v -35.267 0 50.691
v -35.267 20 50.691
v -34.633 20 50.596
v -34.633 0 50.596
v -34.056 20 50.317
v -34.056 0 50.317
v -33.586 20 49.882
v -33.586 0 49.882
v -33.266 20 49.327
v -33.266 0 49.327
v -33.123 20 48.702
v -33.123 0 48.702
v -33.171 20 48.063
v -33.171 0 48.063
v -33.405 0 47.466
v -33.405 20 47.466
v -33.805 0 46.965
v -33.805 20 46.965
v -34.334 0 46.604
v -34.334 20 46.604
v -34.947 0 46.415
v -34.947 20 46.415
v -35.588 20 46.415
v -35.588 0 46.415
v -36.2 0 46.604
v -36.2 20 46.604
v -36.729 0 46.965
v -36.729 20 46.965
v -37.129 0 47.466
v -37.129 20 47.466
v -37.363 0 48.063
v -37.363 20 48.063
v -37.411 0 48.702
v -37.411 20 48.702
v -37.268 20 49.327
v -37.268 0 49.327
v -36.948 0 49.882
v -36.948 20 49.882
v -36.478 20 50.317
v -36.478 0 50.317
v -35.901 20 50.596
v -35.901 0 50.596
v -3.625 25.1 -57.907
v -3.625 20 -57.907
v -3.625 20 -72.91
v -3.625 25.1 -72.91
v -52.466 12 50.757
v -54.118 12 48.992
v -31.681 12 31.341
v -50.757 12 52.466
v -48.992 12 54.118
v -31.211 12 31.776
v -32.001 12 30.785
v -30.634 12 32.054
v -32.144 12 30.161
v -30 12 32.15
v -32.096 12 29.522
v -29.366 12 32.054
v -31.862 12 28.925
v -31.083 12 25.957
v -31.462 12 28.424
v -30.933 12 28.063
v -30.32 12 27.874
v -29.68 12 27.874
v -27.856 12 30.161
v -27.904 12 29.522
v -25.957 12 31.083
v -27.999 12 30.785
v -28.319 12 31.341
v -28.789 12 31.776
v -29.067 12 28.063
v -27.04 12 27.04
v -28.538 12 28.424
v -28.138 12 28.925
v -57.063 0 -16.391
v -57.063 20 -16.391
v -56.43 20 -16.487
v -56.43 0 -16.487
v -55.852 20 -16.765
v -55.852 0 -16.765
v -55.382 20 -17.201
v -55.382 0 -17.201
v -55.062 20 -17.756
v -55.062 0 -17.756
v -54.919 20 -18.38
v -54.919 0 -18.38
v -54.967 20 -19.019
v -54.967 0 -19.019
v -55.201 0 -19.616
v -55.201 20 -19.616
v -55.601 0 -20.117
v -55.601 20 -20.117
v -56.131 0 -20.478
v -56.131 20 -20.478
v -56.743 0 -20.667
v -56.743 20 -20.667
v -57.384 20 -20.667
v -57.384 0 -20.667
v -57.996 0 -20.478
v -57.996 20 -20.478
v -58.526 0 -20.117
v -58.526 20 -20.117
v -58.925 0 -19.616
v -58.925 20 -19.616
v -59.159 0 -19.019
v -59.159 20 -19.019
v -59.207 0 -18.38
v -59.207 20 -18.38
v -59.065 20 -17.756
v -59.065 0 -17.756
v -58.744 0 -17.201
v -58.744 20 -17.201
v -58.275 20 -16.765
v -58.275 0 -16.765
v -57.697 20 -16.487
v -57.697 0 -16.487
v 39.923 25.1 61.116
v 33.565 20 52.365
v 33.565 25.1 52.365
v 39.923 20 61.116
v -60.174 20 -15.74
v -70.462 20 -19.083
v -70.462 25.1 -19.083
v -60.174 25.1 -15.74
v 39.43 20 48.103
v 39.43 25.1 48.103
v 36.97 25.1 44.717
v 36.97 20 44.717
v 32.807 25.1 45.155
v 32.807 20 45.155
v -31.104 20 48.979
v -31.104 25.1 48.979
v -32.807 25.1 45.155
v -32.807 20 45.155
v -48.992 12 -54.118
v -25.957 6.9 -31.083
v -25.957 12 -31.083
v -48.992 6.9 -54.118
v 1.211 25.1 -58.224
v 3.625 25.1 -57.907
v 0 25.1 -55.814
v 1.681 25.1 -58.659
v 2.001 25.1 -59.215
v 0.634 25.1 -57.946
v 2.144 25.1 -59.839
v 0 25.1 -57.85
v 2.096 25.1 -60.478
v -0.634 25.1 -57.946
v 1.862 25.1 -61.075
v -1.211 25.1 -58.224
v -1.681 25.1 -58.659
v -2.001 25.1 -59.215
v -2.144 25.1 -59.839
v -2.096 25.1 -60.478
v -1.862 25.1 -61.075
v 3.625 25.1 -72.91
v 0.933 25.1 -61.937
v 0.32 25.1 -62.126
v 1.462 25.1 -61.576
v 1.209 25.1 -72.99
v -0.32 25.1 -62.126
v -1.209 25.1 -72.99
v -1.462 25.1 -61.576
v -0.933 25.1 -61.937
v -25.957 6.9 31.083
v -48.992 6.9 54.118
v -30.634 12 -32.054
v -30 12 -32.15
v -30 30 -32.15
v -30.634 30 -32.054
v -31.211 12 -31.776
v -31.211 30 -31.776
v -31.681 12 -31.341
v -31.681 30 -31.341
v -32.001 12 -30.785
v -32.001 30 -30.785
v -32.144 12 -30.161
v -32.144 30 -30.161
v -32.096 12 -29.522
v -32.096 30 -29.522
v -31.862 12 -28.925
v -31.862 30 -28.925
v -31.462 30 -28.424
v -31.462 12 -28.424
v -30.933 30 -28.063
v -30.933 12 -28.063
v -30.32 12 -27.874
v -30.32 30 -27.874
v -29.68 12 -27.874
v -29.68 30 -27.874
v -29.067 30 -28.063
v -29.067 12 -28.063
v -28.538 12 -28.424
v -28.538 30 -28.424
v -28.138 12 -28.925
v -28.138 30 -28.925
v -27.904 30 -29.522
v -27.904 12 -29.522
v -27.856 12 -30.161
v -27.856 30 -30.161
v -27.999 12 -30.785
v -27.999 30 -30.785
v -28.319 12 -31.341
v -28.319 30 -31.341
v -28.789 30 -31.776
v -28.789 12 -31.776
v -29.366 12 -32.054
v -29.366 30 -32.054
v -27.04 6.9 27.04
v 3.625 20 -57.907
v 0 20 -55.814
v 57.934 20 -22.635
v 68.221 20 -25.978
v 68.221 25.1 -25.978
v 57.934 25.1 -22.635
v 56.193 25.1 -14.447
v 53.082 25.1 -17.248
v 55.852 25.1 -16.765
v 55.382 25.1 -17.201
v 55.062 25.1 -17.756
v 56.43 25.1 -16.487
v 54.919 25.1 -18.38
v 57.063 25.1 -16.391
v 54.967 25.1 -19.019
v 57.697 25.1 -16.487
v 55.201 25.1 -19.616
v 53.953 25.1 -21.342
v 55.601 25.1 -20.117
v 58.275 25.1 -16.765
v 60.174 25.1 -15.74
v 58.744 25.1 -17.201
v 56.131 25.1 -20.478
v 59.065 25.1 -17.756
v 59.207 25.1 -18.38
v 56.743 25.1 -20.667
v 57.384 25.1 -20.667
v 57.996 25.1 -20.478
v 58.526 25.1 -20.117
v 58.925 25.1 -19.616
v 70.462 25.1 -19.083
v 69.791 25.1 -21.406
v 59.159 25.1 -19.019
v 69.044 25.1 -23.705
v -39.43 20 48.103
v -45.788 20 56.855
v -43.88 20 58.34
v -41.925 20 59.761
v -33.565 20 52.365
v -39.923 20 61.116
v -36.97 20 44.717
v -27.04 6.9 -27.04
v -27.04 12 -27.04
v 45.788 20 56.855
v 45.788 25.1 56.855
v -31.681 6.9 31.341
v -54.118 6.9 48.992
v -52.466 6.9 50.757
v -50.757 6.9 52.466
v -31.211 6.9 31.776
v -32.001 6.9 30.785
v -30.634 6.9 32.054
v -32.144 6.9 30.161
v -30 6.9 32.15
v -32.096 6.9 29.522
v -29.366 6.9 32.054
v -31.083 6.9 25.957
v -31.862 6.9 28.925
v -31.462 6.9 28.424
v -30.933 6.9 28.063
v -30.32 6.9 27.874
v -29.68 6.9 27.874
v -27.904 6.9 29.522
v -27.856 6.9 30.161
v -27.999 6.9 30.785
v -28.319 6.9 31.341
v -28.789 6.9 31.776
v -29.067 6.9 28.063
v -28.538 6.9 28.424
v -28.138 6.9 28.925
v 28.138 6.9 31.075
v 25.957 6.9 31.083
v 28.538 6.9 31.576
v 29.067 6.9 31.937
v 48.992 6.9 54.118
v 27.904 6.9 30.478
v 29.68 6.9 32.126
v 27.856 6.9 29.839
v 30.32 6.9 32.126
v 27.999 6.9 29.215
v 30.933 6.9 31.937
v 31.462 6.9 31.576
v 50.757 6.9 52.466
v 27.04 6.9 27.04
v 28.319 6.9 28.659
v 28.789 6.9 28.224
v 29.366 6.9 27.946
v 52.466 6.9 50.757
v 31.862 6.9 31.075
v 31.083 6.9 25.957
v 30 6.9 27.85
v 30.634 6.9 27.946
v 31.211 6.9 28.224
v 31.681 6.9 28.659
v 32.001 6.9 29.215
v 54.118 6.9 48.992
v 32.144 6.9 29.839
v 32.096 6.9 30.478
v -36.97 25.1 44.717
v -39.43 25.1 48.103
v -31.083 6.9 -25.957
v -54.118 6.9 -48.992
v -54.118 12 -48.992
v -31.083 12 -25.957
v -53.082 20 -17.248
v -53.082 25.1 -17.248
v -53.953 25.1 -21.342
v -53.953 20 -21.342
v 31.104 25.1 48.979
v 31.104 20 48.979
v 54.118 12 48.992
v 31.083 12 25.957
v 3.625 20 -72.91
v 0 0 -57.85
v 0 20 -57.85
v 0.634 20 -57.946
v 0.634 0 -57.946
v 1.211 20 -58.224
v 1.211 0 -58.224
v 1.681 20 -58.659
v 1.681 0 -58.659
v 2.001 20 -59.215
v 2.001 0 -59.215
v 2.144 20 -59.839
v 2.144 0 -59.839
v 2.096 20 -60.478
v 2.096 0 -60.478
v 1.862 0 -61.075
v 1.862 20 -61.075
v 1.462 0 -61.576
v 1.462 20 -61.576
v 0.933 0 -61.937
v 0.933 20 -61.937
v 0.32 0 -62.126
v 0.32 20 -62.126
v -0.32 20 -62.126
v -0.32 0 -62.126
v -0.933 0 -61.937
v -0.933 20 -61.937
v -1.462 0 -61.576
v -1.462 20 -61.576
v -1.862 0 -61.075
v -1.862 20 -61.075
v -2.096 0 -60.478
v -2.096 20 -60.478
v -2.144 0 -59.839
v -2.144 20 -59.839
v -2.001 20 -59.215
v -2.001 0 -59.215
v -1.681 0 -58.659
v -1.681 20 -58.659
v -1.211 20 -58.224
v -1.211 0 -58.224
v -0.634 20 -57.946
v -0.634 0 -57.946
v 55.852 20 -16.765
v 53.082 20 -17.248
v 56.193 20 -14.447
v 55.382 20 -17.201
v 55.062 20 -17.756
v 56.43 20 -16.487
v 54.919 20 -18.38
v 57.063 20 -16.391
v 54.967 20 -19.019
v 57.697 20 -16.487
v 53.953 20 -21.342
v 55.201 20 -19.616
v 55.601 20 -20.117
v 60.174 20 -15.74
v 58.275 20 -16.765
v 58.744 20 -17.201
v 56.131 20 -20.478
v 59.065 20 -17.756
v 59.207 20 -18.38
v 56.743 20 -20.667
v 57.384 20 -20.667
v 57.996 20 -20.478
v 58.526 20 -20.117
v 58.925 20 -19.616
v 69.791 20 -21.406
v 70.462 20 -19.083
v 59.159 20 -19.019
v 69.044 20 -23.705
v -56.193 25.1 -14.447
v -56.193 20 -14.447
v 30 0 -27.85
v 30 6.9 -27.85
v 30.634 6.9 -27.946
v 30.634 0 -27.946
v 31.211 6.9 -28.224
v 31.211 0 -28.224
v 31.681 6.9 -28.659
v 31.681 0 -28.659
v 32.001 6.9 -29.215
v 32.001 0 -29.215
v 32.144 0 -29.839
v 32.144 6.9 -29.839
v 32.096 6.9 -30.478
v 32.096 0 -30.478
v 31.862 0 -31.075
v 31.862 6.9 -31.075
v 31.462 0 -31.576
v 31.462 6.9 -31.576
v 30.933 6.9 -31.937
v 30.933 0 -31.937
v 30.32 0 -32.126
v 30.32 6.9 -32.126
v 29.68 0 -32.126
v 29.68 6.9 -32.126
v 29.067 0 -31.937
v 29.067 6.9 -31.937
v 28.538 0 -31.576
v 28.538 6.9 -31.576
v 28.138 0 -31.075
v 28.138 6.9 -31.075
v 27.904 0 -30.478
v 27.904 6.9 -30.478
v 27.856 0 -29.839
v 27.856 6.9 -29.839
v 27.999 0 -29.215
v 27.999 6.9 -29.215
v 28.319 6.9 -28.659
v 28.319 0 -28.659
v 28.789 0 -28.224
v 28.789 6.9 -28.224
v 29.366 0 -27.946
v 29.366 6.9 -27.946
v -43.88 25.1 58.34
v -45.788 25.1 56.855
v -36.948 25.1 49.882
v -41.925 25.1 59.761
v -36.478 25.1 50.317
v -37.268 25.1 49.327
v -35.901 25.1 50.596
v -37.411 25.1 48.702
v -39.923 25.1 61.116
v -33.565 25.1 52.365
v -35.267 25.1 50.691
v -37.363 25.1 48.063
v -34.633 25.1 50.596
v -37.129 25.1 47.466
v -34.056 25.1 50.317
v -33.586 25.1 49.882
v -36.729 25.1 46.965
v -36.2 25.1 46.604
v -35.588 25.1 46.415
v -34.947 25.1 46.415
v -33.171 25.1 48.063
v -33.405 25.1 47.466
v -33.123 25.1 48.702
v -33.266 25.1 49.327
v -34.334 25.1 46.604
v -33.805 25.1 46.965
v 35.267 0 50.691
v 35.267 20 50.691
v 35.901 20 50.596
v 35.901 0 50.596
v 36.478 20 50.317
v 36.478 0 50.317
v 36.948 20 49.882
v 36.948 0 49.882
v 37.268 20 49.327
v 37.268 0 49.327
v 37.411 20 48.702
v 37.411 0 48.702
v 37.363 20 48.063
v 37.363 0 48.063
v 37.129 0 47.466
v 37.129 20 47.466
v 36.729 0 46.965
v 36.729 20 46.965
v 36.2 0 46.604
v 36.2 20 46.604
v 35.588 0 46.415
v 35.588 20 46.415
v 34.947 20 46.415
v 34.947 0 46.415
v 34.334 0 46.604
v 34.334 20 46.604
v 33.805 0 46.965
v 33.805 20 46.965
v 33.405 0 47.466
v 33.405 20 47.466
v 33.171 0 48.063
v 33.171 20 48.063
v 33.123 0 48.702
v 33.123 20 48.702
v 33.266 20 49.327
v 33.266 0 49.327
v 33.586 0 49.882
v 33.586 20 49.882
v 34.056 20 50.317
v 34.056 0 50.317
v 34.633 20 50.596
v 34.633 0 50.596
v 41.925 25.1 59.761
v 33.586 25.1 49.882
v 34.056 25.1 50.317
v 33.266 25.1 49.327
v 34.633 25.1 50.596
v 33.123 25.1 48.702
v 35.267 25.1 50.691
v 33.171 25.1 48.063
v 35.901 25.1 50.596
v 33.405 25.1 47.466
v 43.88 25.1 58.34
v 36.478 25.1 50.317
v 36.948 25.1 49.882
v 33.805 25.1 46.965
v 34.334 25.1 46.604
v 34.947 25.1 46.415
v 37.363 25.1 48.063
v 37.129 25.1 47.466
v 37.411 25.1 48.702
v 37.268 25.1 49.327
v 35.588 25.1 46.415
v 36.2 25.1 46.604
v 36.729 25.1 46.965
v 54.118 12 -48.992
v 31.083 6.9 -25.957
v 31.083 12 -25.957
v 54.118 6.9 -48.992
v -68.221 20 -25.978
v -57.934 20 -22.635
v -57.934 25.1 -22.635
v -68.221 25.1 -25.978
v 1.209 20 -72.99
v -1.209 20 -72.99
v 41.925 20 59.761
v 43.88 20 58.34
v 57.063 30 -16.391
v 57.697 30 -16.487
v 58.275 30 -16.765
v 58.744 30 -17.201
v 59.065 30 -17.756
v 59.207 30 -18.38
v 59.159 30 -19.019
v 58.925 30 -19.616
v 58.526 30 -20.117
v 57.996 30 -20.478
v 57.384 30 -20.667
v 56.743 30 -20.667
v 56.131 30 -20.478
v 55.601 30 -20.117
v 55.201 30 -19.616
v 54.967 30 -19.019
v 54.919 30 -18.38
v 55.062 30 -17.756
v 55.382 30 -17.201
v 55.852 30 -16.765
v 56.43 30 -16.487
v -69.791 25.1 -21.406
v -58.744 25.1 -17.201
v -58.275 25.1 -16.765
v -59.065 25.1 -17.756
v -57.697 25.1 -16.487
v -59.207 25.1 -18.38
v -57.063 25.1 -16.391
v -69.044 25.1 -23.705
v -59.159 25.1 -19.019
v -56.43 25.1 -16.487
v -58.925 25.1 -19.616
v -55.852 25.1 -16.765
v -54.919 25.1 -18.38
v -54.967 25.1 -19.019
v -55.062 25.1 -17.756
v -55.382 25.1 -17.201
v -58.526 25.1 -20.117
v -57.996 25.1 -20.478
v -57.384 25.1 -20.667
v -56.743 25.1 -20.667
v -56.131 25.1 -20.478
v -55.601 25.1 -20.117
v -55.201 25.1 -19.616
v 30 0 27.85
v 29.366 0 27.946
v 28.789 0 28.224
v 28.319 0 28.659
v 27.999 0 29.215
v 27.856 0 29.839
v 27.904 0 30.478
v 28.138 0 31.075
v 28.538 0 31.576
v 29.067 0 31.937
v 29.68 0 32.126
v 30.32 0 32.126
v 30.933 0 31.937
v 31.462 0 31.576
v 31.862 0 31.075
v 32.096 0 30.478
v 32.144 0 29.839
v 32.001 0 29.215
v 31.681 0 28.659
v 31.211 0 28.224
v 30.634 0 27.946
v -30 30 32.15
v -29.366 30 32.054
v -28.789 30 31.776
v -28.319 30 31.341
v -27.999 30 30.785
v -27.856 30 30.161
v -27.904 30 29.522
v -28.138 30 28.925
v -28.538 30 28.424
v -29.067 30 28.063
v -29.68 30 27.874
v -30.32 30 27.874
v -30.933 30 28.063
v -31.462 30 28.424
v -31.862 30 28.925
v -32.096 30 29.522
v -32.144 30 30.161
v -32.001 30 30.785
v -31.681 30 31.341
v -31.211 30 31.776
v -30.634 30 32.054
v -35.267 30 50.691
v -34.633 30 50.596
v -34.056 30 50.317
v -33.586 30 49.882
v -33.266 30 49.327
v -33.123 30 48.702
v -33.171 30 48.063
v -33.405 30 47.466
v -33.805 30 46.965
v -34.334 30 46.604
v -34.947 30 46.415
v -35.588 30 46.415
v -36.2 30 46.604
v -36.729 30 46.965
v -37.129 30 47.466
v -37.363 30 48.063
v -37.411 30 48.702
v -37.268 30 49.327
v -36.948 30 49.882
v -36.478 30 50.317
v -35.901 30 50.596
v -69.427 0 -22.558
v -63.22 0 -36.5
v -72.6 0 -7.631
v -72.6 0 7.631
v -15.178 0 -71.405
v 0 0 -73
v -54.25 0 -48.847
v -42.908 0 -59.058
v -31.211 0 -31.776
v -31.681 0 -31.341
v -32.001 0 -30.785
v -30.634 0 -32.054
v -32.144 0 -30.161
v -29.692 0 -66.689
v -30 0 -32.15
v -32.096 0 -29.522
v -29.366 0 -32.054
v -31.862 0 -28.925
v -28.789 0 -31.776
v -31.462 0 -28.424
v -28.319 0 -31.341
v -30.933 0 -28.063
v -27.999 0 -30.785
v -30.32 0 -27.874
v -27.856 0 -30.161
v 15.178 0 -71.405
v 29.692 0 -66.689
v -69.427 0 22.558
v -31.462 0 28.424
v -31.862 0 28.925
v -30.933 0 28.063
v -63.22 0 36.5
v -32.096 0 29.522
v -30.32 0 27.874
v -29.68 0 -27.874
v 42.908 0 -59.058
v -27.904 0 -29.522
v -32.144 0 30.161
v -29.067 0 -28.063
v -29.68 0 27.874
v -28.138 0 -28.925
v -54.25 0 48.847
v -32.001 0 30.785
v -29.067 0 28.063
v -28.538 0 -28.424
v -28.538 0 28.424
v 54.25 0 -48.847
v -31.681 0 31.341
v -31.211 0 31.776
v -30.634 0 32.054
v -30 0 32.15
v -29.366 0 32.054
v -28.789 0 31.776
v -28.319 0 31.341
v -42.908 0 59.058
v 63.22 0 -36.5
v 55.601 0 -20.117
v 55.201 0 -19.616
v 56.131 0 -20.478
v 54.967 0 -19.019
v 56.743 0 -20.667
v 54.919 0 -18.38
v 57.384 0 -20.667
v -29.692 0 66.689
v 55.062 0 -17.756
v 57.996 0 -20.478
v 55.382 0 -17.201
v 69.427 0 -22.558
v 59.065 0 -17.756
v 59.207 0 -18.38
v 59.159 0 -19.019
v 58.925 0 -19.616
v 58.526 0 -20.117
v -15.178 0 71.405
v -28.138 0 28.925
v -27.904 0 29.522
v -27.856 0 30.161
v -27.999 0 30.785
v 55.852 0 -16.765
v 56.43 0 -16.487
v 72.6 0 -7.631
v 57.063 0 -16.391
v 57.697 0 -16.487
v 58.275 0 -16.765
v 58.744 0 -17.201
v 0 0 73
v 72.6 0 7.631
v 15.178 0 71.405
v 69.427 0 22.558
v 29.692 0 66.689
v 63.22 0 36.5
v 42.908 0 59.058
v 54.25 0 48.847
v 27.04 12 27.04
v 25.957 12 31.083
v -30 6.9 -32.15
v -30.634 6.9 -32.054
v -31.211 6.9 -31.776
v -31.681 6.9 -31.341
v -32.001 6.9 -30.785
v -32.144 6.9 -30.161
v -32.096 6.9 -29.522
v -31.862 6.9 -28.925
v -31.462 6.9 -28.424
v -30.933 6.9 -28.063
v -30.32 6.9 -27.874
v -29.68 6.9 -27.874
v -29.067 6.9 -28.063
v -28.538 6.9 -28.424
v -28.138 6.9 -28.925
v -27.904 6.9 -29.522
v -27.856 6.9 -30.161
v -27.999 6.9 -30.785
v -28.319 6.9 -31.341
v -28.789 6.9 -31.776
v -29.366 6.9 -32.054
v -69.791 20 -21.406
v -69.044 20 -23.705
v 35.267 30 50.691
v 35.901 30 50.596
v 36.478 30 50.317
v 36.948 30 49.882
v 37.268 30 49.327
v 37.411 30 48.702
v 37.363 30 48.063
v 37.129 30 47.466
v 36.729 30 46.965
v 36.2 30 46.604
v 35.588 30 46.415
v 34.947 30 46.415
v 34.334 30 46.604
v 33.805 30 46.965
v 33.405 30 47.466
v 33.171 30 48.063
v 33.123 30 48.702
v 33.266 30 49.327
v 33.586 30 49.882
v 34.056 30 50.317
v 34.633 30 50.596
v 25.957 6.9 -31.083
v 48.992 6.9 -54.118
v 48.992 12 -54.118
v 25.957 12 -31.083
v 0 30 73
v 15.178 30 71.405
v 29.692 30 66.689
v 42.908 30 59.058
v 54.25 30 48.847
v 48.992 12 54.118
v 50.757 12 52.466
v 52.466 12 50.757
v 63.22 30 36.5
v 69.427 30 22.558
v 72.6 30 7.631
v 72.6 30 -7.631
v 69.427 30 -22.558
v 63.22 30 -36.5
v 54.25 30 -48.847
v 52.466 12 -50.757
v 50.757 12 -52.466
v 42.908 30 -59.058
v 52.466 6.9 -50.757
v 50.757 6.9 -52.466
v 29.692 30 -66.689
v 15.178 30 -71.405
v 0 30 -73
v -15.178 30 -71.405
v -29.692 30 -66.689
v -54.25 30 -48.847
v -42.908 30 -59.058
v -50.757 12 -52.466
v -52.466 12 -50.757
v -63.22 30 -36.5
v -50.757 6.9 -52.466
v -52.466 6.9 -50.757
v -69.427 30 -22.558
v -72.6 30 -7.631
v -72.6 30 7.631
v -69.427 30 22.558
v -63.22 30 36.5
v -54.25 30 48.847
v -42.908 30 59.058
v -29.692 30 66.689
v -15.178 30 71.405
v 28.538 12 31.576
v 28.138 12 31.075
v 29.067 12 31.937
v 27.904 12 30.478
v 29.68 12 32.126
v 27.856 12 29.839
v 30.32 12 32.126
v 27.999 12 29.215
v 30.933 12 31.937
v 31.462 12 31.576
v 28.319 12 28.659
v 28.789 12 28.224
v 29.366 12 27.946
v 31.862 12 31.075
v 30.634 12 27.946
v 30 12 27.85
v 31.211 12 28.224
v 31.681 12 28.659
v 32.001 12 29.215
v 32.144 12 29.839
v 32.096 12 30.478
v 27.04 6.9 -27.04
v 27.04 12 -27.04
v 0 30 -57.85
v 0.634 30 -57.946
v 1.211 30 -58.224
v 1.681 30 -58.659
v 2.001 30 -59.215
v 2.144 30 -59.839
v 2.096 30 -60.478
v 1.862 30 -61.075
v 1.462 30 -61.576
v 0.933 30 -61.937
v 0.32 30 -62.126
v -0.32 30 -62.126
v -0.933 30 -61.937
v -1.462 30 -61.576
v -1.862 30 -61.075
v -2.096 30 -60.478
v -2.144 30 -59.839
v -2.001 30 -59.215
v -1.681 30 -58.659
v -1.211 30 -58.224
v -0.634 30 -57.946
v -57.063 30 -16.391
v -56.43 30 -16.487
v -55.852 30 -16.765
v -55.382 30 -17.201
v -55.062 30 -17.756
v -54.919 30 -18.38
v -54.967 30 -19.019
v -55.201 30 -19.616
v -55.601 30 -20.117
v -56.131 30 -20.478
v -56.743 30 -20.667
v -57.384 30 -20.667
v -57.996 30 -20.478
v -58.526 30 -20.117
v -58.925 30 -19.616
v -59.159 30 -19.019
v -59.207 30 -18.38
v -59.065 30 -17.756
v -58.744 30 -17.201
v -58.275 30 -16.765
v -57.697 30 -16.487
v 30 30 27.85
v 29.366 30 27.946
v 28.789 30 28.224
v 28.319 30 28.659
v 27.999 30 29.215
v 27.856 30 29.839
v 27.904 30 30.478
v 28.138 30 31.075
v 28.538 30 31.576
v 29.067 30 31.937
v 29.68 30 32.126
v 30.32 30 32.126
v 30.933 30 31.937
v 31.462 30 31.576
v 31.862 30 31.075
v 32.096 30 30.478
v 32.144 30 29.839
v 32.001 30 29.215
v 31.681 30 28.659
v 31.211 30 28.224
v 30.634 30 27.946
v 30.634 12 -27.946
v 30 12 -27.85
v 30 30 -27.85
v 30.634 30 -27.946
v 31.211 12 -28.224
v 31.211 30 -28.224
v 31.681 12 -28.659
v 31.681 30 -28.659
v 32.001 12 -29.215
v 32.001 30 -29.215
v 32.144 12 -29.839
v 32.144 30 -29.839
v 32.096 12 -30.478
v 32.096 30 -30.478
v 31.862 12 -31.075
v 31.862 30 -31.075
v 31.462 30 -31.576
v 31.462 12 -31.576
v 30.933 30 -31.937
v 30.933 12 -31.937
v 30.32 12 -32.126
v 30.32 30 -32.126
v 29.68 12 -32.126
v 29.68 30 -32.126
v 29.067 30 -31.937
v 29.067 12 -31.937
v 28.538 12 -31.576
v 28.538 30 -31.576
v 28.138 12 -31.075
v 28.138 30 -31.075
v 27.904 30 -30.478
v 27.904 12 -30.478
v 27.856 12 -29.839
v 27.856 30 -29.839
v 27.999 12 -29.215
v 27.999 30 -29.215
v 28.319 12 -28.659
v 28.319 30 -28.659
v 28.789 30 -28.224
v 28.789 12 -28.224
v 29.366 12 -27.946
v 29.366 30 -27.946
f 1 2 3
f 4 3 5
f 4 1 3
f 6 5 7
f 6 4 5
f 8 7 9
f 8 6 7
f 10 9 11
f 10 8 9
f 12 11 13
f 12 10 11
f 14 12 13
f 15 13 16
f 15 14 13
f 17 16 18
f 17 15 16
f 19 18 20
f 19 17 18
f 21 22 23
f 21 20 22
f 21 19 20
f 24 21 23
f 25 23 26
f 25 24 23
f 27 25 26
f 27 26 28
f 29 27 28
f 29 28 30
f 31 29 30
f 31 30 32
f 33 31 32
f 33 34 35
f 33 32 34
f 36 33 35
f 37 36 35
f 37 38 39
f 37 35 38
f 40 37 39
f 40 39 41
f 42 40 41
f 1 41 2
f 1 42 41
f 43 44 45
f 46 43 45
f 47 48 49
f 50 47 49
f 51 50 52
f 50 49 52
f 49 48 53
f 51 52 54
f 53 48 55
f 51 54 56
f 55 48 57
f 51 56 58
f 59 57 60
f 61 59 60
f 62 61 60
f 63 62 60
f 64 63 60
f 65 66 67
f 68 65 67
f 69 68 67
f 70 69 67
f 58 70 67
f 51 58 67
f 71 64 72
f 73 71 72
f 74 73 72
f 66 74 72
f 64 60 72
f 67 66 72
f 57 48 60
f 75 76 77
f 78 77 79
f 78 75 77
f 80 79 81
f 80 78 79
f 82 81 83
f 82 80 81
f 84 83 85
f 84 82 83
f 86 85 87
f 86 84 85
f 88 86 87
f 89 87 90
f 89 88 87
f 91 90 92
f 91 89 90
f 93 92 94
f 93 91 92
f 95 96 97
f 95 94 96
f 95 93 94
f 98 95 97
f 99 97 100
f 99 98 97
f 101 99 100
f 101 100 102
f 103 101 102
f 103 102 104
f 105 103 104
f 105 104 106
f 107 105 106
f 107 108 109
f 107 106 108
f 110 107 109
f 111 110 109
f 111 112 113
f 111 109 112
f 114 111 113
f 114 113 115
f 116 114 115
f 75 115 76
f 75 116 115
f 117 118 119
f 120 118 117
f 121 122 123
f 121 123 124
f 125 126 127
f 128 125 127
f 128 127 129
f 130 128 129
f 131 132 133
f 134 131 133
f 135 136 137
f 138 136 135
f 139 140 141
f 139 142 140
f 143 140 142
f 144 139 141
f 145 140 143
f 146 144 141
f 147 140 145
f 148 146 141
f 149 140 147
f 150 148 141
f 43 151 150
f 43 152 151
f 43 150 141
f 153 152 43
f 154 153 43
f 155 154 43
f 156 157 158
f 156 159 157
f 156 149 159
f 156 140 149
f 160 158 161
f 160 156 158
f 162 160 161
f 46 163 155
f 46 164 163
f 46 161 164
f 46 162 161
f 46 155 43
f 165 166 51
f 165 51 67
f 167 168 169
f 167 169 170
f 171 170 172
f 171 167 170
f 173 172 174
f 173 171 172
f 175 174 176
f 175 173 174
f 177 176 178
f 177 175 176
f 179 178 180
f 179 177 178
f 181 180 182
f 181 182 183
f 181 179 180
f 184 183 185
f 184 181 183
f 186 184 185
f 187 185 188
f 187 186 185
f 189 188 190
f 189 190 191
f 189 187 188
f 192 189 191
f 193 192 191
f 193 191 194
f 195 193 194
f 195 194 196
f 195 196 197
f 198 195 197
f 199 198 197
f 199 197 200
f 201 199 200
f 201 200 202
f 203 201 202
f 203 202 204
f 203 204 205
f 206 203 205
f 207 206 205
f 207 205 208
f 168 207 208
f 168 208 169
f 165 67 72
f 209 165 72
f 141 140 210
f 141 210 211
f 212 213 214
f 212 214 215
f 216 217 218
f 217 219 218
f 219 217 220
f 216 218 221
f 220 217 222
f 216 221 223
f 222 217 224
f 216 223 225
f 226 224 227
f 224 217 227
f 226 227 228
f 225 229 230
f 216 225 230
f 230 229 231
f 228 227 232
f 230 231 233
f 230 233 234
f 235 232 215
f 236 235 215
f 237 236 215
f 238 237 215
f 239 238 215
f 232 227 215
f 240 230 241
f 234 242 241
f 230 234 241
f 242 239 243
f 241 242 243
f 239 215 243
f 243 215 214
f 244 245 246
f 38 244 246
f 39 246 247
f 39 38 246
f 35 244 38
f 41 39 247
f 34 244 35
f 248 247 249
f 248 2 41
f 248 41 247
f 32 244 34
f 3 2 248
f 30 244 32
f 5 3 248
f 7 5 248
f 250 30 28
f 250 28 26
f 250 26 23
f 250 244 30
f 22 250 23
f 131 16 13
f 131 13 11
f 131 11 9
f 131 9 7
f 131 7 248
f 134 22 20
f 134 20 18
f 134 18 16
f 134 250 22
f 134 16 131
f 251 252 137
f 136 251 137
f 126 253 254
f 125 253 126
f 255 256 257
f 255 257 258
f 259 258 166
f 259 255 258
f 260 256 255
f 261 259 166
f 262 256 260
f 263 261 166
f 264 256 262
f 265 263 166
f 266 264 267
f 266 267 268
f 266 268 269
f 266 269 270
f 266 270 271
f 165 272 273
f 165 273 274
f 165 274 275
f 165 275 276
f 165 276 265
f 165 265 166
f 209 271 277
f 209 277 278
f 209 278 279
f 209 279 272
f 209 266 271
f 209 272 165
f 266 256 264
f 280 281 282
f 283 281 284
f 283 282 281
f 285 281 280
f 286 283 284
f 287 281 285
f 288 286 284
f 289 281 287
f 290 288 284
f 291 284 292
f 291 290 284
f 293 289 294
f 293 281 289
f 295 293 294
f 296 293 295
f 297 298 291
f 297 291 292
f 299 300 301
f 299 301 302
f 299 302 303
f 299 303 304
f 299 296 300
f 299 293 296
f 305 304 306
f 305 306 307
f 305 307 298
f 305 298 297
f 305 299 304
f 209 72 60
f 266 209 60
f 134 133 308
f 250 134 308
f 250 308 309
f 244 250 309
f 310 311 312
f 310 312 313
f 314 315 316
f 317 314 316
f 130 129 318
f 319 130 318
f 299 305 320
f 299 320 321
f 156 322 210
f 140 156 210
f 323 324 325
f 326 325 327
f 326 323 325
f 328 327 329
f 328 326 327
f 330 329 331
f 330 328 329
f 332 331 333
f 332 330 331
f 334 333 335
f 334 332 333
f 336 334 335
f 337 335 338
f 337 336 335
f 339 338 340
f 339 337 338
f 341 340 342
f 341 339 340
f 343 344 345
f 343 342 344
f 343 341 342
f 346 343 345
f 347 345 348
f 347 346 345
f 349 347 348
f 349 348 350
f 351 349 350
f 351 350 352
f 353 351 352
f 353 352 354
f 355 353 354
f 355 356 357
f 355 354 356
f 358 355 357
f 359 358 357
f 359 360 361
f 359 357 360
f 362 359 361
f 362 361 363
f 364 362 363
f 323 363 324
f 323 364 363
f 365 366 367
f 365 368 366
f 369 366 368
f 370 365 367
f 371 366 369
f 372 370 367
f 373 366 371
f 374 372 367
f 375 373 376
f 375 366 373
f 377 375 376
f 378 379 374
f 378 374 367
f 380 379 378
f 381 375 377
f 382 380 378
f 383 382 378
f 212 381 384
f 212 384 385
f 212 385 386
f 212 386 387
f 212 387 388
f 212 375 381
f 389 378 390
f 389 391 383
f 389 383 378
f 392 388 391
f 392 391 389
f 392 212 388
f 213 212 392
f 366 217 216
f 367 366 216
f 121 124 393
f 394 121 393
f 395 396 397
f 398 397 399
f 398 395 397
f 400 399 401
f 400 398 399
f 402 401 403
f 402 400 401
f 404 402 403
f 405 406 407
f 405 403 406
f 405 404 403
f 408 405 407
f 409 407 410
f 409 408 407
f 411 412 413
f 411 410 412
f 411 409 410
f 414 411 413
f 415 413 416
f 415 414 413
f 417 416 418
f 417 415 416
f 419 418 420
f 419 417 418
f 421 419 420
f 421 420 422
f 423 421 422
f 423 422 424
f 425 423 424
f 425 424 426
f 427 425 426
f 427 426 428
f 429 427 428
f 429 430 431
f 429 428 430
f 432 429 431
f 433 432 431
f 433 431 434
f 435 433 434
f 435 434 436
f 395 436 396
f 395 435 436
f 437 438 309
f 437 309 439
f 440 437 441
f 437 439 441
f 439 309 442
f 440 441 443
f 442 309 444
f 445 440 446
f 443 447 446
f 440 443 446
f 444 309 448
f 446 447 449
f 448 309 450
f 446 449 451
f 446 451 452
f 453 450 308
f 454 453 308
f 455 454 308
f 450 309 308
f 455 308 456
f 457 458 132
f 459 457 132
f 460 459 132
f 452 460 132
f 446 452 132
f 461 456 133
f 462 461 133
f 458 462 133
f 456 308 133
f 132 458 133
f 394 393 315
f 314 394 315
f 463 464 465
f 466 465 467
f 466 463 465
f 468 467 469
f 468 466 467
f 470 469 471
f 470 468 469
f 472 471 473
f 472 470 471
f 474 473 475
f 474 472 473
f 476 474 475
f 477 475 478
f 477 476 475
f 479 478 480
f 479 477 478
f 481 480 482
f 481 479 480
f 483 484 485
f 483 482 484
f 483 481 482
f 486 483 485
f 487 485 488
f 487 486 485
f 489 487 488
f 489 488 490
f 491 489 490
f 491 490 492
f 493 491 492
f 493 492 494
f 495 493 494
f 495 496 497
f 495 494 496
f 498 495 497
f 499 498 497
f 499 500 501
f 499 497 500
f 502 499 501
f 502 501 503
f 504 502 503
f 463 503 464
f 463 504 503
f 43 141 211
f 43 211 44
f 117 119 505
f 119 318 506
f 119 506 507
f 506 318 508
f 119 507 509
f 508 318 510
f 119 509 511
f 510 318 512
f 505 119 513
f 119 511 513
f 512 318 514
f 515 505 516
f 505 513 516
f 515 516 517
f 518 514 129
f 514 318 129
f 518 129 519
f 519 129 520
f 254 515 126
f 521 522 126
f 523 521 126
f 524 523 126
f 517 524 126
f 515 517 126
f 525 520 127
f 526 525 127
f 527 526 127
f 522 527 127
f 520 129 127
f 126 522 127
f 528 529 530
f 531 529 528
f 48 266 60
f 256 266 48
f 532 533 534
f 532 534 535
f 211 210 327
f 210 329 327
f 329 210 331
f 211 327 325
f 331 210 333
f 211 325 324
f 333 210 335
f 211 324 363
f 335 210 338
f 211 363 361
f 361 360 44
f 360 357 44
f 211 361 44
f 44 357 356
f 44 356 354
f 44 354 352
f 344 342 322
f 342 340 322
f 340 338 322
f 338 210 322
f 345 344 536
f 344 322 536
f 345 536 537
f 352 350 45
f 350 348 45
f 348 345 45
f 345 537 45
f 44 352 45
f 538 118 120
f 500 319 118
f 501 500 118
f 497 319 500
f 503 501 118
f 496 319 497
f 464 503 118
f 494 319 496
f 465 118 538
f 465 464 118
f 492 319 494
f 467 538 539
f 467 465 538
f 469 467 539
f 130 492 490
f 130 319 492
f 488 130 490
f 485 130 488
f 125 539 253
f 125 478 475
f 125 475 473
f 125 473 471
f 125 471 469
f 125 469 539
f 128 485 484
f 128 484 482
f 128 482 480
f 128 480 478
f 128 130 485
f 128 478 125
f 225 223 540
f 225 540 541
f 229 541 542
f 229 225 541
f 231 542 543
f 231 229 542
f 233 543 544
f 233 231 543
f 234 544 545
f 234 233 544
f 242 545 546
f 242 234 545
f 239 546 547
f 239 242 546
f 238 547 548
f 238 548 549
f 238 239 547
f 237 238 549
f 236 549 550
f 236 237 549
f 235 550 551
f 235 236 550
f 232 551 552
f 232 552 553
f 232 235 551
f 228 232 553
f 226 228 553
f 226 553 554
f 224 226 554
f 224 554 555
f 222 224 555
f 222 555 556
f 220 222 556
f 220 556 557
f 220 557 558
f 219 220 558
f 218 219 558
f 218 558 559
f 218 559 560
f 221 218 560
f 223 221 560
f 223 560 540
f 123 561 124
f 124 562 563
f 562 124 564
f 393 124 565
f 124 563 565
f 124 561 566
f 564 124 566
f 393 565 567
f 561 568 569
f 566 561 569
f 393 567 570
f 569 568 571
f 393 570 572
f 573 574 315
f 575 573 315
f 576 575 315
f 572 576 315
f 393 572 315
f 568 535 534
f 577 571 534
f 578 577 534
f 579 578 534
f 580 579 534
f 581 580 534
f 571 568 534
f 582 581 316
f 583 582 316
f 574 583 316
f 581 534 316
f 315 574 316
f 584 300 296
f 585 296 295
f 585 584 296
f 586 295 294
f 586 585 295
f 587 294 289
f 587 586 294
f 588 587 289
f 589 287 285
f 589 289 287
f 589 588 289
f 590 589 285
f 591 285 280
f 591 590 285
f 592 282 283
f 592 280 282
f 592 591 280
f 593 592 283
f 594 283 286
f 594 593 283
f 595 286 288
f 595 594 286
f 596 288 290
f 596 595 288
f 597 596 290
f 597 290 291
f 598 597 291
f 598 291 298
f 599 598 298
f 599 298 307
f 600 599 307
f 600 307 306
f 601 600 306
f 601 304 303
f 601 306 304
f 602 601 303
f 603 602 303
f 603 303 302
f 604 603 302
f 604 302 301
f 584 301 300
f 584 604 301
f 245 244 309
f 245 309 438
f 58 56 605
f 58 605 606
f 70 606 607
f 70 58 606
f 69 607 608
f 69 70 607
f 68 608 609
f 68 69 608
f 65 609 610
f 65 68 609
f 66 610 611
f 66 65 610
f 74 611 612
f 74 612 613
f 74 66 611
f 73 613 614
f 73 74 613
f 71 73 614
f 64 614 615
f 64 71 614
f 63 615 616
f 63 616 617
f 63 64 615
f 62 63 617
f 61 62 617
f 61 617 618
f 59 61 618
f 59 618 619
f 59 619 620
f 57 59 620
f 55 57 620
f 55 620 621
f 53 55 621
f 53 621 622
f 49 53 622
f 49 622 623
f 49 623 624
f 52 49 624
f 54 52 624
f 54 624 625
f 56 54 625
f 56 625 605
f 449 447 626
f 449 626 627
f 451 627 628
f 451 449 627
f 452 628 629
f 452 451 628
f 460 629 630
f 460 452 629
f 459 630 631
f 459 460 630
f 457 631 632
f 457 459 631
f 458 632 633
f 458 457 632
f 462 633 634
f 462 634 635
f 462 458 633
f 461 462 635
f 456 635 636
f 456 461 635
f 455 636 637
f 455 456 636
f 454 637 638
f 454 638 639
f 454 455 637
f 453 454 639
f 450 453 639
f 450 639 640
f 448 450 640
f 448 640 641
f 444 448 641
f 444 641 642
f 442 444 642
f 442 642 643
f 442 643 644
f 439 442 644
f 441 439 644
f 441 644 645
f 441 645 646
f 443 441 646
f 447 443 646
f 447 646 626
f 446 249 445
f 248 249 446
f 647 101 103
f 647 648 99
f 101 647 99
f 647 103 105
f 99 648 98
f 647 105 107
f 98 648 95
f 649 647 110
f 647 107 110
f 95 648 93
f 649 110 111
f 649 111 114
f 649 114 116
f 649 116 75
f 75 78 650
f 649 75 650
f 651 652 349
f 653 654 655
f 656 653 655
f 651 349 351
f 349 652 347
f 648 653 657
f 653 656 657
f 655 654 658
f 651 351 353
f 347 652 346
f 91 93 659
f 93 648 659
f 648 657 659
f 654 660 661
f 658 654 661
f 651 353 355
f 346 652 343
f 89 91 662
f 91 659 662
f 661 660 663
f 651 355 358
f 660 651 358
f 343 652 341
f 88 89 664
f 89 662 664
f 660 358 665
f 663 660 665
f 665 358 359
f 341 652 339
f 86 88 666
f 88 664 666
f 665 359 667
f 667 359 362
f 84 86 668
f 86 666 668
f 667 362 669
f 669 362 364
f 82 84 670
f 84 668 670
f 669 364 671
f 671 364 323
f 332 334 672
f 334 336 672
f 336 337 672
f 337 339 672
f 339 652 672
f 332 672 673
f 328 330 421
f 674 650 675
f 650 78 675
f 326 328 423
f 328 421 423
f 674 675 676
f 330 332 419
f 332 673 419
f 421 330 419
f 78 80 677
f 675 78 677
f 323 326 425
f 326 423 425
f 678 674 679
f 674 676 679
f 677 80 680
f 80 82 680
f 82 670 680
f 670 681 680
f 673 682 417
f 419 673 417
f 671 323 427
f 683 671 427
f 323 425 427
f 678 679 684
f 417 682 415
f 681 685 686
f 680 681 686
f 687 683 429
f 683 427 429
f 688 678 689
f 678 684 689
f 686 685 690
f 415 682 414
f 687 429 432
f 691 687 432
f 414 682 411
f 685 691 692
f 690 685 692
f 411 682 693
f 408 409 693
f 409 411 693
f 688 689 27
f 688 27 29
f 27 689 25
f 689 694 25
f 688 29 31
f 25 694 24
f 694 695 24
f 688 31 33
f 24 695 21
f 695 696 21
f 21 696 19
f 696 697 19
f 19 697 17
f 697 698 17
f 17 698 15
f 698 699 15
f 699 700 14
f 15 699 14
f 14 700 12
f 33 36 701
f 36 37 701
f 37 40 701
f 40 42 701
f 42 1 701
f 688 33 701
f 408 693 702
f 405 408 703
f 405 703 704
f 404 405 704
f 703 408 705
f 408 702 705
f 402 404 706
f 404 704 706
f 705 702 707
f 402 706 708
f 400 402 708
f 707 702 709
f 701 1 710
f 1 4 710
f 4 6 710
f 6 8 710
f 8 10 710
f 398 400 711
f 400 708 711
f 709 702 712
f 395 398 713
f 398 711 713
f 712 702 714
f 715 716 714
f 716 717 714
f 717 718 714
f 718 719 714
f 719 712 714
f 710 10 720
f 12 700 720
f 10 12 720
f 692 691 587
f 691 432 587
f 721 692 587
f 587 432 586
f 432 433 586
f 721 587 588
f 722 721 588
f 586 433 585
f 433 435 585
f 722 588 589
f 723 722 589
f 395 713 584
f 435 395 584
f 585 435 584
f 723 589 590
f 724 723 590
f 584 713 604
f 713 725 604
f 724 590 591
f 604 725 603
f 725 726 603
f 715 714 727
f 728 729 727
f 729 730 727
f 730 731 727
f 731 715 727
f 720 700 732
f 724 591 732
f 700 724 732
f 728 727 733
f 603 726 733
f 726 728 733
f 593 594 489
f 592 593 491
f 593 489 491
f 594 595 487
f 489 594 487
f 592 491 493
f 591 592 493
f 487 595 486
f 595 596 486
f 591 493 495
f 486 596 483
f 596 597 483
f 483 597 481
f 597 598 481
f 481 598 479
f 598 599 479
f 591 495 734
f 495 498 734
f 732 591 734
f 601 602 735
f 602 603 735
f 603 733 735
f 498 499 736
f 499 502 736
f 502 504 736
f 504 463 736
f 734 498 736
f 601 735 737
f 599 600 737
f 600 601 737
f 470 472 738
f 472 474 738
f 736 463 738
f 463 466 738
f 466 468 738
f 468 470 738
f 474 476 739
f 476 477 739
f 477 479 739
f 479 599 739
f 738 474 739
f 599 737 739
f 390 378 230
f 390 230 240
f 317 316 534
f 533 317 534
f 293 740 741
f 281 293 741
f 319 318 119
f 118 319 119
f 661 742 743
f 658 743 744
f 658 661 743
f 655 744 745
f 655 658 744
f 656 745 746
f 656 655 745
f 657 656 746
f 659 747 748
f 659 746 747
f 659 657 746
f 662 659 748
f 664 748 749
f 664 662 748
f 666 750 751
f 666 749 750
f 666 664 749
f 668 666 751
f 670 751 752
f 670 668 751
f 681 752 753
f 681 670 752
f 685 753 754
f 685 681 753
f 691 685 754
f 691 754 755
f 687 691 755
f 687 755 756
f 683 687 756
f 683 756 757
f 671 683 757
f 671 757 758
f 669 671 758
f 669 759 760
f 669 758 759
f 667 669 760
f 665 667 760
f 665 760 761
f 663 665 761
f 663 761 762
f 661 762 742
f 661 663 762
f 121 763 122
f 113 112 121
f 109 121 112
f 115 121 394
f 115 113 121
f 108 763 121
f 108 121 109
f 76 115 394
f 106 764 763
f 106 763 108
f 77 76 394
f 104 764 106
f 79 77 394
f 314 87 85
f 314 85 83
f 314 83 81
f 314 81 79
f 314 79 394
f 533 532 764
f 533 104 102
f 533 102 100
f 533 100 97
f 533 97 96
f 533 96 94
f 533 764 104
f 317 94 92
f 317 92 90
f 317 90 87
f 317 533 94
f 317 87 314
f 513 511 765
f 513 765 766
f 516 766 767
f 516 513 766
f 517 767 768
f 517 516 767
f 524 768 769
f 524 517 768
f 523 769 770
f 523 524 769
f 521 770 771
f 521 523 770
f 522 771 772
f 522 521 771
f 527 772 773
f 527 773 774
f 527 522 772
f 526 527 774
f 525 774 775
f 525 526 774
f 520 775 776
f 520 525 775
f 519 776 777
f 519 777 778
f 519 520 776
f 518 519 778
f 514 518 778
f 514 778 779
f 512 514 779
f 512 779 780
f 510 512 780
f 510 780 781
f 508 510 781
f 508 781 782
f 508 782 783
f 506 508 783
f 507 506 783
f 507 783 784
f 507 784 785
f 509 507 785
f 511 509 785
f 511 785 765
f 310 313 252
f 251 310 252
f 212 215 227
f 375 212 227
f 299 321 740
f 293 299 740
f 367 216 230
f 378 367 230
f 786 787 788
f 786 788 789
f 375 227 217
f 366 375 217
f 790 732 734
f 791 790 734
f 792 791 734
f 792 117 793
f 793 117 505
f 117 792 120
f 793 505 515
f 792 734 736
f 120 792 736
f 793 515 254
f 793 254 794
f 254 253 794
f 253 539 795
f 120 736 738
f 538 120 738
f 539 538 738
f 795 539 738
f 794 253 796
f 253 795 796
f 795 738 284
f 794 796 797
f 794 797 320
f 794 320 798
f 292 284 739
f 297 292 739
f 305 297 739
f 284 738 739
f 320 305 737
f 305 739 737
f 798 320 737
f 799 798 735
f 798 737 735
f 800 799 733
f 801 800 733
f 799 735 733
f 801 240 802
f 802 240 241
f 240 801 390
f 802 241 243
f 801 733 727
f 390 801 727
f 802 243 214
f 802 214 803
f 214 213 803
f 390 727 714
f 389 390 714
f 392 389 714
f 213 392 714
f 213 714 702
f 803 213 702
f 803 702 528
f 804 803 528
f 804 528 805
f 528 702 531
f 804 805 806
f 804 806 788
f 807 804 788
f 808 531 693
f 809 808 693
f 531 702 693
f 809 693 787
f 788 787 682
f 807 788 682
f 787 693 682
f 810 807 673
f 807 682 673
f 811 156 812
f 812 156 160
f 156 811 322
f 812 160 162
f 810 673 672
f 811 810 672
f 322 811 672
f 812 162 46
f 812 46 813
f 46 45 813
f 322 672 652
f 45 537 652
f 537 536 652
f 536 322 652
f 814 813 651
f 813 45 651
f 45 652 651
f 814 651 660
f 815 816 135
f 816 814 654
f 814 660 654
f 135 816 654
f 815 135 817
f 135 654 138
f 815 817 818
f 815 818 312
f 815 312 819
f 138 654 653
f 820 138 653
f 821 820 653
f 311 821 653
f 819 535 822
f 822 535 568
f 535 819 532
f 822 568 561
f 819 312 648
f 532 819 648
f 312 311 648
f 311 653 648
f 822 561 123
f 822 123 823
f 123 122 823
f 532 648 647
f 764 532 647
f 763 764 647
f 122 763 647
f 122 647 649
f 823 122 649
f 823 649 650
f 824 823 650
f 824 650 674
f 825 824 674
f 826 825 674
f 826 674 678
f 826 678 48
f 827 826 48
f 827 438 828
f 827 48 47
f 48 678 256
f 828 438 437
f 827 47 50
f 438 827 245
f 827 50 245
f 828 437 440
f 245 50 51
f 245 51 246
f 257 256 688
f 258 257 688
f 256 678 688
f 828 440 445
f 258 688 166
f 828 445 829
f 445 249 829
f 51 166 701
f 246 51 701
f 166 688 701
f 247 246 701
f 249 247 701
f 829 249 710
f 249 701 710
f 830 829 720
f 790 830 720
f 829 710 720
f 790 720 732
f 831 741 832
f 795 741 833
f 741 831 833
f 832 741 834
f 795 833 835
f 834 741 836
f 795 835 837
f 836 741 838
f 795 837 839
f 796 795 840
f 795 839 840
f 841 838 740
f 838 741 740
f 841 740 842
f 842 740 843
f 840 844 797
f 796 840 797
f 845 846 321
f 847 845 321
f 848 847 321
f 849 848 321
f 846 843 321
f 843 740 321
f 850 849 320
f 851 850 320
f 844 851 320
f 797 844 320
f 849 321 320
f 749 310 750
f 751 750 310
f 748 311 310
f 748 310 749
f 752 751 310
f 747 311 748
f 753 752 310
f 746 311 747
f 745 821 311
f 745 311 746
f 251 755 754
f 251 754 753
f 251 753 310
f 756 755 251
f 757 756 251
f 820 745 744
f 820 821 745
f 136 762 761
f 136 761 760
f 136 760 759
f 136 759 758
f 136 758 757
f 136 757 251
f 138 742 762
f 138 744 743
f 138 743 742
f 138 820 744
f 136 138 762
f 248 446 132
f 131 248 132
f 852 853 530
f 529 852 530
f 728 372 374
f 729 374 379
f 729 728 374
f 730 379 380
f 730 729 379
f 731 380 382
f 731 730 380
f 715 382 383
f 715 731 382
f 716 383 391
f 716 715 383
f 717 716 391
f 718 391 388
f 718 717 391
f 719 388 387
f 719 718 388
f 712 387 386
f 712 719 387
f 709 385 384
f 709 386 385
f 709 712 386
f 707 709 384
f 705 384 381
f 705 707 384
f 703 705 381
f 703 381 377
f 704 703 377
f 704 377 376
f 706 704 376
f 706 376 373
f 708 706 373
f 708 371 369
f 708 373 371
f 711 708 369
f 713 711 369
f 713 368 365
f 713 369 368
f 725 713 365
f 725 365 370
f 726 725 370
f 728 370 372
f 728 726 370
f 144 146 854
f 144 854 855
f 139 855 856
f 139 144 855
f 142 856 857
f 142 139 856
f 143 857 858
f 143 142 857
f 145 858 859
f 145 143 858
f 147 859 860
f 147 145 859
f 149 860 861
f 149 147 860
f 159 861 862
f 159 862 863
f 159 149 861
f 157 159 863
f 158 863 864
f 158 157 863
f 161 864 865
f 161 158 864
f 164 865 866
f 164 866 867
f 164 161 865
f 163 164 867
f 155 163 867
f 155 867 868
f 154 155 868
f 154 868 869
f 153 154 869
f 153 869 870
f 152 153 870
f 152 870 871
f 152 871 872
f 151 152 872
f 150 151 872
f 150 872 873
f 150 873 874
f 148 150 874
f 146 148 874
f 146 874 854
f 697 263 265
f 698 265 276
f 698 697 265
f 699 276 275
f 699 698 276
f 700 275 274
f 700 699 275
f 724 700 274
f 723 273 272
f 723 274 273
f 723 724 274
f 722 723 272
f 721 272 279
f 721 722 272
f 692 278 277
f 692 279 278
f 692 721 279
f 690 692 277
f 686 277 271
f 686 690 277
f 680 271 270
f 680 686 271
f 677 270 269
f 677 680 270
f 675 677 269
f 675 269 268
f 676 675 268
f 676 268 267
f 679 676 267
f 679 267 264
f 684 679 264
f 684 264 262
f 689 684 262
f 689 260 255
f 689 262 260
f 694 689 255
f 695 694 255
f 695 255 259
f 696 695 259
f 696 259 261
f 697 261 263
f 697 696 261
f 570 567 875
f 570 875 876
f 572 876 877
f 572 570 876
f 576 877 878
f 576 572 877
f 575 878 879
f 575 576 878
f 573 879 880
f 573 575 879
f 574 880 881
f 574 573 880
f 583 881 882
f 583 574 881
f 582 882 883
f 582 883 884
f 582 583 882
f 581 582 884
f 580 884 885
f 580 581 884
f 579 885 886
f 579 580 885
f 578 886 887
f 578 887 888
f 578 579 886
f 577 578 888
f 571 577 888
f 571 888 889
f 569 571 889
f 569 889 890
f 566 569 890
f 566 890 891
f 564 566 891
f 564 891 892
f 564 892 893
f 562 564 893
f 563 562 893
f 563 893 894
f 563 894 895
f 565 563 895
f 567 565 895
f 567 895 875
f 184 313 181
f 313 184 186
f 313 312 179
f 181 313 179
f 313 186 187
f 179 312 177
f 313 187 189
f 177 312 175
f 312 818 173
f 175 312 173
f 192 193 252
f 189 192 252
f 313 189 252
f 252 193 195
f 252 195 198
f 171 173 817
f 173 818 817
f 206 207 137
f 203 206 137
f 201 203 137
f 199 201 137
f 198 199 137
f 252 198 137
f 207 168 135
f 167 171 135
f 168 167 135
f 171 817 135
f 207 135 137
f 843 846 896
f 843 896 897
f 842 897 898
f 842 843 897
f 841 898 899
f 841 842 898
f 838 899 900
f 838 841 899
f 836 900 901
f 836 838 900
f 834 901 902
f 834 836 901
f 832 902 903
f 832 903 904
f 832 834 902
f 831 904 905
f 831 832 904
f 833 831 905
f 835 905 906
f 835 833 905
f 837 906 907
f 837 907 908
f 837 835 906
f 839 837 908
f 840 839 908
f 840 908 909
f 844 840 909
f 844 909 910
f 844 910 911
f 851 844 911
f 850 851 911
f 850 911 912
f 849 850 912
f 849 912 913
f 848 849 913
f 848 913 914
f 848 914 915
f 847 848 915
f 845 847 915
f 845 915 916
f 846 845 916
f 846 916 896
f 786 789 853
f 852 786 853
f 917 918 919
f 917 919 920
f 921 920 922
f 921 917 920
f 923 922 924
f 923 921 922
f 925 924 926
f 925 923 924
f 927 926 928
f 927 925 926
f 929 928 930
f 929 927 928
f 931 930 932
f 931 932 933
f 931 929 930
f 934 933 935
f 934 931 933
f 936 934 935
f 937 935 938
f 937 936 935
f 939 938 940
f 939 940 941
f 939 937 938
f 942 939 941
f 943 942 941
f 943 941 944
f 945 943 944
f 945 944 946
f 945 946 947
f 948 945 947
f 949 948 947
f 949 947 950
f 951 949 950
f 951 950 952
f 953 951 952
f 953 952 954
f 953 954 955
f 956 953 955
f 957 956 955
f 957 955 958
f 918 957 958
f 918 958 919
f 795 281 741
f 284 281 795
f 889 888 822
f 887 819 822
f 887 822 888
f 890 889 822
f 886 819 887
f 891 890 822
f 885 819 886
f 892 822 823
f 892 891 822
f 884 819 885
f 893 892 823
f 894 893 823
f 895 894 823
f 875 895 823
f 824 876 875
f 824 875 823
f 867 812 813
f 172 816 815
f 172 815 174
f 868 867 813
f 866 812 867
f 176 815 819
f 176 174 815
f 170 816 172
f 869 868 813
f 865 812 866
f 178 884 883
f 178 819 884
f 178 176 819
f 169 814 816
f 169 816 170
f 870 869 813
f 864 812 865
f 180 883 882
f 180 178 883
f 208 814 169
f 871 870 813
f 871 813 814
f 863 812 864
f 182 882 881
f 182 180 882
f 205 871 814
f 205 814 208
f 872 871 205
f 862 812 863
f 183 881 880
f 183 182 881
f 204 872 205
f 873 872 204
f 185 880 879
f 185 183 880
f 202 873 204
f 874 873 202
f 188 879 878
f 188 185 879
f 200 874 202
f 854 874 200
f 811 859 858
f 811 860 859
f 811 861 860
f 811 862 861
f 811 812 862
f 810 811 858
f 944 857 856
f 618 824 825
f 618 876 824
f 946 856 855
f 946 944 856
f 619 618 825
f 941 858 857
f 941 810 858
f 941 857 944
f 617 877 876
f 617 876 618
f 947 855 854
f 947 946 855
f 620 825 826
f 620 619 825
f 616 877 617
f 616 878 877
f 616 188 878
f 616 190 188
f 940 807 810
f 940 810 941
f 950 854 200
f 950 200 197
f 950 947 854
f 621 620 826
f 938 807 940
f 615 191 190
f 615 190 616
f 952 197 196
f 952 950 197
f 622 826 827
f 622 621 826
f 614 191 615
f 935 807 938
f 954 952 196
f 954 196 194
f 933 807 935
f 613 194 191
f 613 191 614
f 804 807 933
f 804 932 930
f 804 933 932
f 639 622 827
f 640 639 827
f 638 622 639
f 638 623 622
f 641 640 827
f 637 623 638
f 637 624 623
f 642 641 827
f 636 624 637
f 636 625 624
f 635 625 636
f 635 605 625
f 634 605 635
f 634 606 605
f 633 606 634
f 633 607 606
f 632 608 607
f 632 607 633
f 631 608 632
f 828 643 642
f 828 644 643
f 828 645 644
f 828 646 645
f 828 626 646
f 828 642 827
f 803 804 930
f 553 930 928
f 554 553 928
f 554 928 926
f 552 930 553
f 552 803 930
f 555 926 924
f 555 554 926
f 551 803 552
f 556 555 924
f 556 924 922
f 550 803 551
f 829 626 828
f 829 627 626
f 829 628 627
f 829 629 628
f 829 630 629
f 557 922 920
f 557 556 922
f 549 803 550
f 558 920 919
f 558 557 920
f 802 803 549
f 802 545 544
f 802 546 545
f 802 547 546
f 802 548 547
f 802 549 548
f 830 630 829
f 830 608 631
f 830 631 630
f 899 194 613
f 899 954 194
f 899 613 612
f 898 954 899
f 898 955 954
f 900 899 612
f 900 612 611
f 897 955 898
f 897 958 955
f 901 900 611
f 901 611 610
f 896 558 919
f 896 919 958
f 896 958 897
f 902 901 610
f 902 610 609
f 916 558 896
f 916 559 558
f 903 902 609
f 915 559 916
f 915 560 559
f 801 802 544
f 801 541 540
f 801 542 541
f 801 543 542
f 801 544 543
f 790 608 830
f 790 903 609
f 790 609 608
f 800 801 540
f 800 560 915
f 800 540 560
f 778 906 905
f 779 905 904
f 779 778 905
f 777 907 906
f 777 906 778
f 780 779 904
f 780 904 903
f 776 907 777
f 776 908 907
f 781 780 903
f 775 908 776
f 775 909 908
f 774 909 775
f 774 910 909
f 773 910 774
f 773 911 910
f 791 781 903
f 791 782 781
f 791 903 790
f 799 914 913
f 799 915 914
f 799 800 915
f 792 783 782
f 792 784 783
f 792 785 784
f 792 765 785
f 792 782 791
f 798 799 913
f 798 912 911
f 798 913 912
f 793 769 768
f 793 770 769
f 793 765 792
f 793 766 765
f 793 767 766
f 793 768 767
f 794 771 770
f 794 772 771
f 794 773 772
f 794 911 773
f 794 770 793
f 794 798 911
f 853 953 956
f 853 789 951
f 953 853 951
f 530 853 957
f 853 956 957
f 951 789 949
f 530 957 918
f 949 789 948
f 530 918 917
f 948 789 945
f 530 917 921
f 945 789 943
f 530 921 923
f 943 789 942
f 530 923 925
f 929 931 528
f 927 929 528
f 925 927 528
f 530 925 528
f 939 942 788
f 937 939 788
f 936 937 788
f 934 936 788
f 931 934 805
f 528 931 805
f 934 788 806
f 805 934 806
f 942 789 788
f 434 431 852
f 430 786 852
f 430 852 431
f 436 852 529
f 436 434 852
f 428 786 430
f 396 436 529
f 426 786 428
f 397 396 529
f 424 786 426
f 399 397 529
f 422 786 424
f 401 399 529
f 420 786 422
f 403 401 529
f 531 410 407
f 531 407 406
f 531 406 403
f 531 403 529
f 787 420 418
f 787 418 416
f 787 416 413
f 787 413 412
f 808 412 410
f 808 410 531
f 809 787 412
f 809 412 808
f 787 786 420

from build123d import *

# Parameters (mm, degrees)
SKETCH1_R           = 73
SKETCH1_R_2         = 2.15
BOSS_EXTRUDE1_DEPTH = 30
CUT_EXTRUDE1_START  = -5.1
CUT_EXTRUDE1_DEPTH  = 5.1
CUT_EXTRUDE2_DEPTH  = 5.1


with BuildPart() as part:
    # Sketch1 → Boss-Extrude1 (new body)
    with BuildSketch(Plane(origin=(0, 0, 0), x_dir=(1, 0, 0), z_dir=(0, 1, 0))):
        with Locations(Location((0, 0, 0), (0, 0, 270))):
            Circle(SKETCH1_R)
        with Locations(Location((30, 30, 0), (0, 0, 270))):
            Circle(SKETCH1_R_2, mode=Mode.SUBTRACT)
        with Locations(Location((-30, 30, 0), (0, 0, 90))):
            Circle(SKETCH1_R_2, mode=Mode.SUBTRACT)
        with Locations(Location((30, -30, 0), (0, 0, 90))):
            Circle(SKETCH1_R_2, mode=Mode.SUBTRACT)
        with Locations(Location((-30, -30, 0), (0, 0, 270))):
            Circle(SKETCH1_R_2, mode=Mode.SUBTRACT)
        with Locations(Location((0, 60, 0), (0, 0, 270))):
            Circle(SKETCH1_R_2, mode=Mode.SUBTRACT)
        with Locations(Location((57.063390978, 18.541019662, 0), (0, 0, 270))):
            Circle(SKETCH1_R_2, mode=Mode.SUBTRACT)
        with Locations(Location((35.267115138, -48.541019662, 0), (0, 0, 270))):
            Circle(SKETCH1_R_2, mode=Mode.SUBTRACT)
        with Locations(Location((-35.267115138, -48.541019662, 0), (0, 0, 270))):
            Circle(SKETCH1_R_2, mode=Mode.SUBTRACT)
        with Locations(Location((-57.063390978, 18.541019662, 0), (0, 0, 270))):
            Circle(SKETCH1_R_2, mode=Mode.SUBTRACT)
    extrude(amount=BOSS_EXTRUDE1_DEPTH)

    # Sketch2 → Cut-Extrude1 (cut)
    with BuildSketch(Plane(origin=(0, 12, 0), x_dir=(1, 0, 0), z_dir=(0, 1, 0)).offset(CUT_EXTRUDE1_START)):
        with BuildLine():
            Line((-27.040199894, 27.040199894), (-25.956837865, 31.083362029))
            Line((-25.956837865, 31.083362029), (-28.916637971, 34.043162135))
            Line((-28.916637971, 34.043162135), (-48.991851025, 54.118375189))
            ThreePointArc((-48.991851025, 54.118375189), (-51.618795027, 51.618795027), (-54.118375189, 48.991851025))
            Line((-54.118375189, 48.991851025), (-34.043162135, 28.916637971))
            Line((-34.043162135, 28.916637971), (-31.083362029, 25.956837865))
            Line((-31.083362029, 25.956837865), (-27.040199894, 27.040199894))
        make_face()
        with BuildLine():
            Line((28.916637971, 34.043162135), (25.956837865, 31.083362029))
            Line((25.956837865, 31.083362029), (27.040199894, 27.040199894))
            Line((27.040199894, 27.040199894), (31.083362029, 25.956837865))
            Line((31.083362029, 25.956837865), (34.043162135, 28.916637971))
            Line((34.043162135, 28.916637971), (54.118375189, 48.991851025))
            ThreePointArc((54.118375189, 48.991851025), (51.618795027, 51.618795027), (48.991851025, 54.118375189))
            Line((48.991851025, 54.118375189), (28.916637971, 34.043162135))
        make_face()
        with BuildLine():
            Line((34.043162135, -28.916637971), (31.083362029, -25.956837865))
            Line((31.083362029, -25.956837865), (27.040199894, -27.040199894))
            Line((27.040199894, -27.040199894), (25.956837865, -31.083362029))
            Line((25.956837865, -31.083362029), (28.916637971, -34.043162135))
            Line((28.916637971, -34.043162135), (48.991851025, -54.118375189))
            ThreePointArc((48.991851025, -54.118375189), (51.618795027, -51.618795027), (54.118375189, -48.991851025))
            Line((54.118375189, -48.991851025), (34.043162135, -28.916637971))
        make_face()
        with BuildLine():
            Line((-28.916637971, -34.043162135), (-25.956837865, -31.083362029))
            Line((-25.956837865, -31.083362029), (-27.040199894, -27.040199894))
            Line((-27.040199894, -27.040199894), (-31.083362029, -25.956837865))
            Line((-31.083362029, -25.956837865), (-34.043162135, -28.916637971))
            Line((-34.043162135, -28.916637971), (-54.118375189, -48.991851025))
            ThreePointArc((-54.118375189, -48.991851025), (-51.618795027, -51.618795027), (-48.991851025, -54.118375189))
            Line((-48.991851025, -54.118375189), (-28.916637971, -34.043162135))
        make_face()
    extrude(amount=CUT_EXTRUDE1_DEPTH, mode=Mode.SUBTRACT)

    # Sketch4 → Cut-Extrude2 (cut)
    with BuildSketch(Plane(origin=(0, 20, 0), x_dir=(1, 0, 0), z_dir=(0, 1, 0))):
        with BuildLine():
            Line((-3.625, 62.092894726), (-3.625, 72.909940166))
            ThreePointArc((-3.625, 72.909940166), (0, 73), (3.625, 72.909940166))
            Line((3.625, 72.909940166), (3.625, 62.092894726))
            Line((3.625, 62.092894726), (3.625, 57.907105274))
            Line((3.625, 57.907105274), (0, 55.814210548))
            Line((0, 55.814210548), (-3.625, 57.907105274))
            Line((-3.625, 57.907105274), (-3.625, 62.092894726))
        make_face()
        with BuildLine():
            Line((56.193116415, 14.446699753), (60.174038749, 15.740179829))
            Line((60.174038749, 15.740179829), (70.461660302, 19.082830699))
            ThreePointArc((70.461660302, 19.082830699), (69.42712569, 22.558240589), (68.221287093, 25.977990442))
            Line((68.221287093, 25.977990442), (57.93366554, 22.635339572))
            Line((57.93366554, 22.635339572), (53.952743206, 21.341859496))
            Line((53.952743206, 21.341859496), (53.082468644, 17.247539587))
            Line((53.082468644, 17.247539587), (56.193116415, 14.446699753))
        make_face()
        with BuildLine():
            Line((31.104255879, -48.978553801), (33.564601187, -52.364928603))
            Line((33.564601187, -52.364928603), (39.92270097, -61.116102193))
            ThreePointArc((39.92270097, -61.116102193), (42.908323417, -59.058240589), (45.78807418, -56.854659114))
            Line((45.78807418, -56.854659114), (39.429974397, -48.103485524))
            Line((39.429974397, -48.103485524), (36.969629088, -44.717110722))
            Line((36.969629088, -44.717110722), (32.806769829, -45.154644861))
            Line((32.806769829, -45.154644861), (31.104255879, -48.978553801))
        make_face()
        with BuildLine():
            Line((-36.969629088, -44.717110722), (-39.429974397, -48.103485524))
            Line((-39.429974397, -48.103485524), (-45.78807418, -56.854659114))
            ThreePointArc((-45.78807418, -56.854659114), (-42.908323417, -59.058240589), (-39.92270097, -61.116102193))
            Line((-39.92270097, -61.116102193), (-33.564601187, -52.364928603))
            Line((-33.564601187, -52.364928603), (-31.104255879, -48.978553801))
            Line((-31.104255879, -48.978553801), (-32.806769829, -45.154644861))
            Line((-32.806769829, -45.154644861), (-36.969629088, -44.717110722))
        make_face()
        with BuildLine():
            Line((-53.952743206, 21.341859496), (-57.93366554, 22.635339572))
            Line((-57.93366554, 22.635339572), (-68.221287093, 25.977990442))
            ThreePointArc((-68.221287093, 25.977990442), (-69.42712569, 22.558240589), (-70.461660302, 19.082830699))
            Line((-70.461660302, 19.082830699), (-60.174038749, 15.740179829))
            Line((-60.174038749, 15.740179829), (-56.193116415, 14.446699753))
            Line((-56.193116415, 14.446699753), (-53.082468644, 17.247539587))
            Line((-53.082468644, 17.247539587), (-53.952743206, 21.341859496))
        make_face()
    extrude(amount=CUT_EXTRUDE2_DEPTH, mode=Mode.SUBTRACT)


solid = part.part
